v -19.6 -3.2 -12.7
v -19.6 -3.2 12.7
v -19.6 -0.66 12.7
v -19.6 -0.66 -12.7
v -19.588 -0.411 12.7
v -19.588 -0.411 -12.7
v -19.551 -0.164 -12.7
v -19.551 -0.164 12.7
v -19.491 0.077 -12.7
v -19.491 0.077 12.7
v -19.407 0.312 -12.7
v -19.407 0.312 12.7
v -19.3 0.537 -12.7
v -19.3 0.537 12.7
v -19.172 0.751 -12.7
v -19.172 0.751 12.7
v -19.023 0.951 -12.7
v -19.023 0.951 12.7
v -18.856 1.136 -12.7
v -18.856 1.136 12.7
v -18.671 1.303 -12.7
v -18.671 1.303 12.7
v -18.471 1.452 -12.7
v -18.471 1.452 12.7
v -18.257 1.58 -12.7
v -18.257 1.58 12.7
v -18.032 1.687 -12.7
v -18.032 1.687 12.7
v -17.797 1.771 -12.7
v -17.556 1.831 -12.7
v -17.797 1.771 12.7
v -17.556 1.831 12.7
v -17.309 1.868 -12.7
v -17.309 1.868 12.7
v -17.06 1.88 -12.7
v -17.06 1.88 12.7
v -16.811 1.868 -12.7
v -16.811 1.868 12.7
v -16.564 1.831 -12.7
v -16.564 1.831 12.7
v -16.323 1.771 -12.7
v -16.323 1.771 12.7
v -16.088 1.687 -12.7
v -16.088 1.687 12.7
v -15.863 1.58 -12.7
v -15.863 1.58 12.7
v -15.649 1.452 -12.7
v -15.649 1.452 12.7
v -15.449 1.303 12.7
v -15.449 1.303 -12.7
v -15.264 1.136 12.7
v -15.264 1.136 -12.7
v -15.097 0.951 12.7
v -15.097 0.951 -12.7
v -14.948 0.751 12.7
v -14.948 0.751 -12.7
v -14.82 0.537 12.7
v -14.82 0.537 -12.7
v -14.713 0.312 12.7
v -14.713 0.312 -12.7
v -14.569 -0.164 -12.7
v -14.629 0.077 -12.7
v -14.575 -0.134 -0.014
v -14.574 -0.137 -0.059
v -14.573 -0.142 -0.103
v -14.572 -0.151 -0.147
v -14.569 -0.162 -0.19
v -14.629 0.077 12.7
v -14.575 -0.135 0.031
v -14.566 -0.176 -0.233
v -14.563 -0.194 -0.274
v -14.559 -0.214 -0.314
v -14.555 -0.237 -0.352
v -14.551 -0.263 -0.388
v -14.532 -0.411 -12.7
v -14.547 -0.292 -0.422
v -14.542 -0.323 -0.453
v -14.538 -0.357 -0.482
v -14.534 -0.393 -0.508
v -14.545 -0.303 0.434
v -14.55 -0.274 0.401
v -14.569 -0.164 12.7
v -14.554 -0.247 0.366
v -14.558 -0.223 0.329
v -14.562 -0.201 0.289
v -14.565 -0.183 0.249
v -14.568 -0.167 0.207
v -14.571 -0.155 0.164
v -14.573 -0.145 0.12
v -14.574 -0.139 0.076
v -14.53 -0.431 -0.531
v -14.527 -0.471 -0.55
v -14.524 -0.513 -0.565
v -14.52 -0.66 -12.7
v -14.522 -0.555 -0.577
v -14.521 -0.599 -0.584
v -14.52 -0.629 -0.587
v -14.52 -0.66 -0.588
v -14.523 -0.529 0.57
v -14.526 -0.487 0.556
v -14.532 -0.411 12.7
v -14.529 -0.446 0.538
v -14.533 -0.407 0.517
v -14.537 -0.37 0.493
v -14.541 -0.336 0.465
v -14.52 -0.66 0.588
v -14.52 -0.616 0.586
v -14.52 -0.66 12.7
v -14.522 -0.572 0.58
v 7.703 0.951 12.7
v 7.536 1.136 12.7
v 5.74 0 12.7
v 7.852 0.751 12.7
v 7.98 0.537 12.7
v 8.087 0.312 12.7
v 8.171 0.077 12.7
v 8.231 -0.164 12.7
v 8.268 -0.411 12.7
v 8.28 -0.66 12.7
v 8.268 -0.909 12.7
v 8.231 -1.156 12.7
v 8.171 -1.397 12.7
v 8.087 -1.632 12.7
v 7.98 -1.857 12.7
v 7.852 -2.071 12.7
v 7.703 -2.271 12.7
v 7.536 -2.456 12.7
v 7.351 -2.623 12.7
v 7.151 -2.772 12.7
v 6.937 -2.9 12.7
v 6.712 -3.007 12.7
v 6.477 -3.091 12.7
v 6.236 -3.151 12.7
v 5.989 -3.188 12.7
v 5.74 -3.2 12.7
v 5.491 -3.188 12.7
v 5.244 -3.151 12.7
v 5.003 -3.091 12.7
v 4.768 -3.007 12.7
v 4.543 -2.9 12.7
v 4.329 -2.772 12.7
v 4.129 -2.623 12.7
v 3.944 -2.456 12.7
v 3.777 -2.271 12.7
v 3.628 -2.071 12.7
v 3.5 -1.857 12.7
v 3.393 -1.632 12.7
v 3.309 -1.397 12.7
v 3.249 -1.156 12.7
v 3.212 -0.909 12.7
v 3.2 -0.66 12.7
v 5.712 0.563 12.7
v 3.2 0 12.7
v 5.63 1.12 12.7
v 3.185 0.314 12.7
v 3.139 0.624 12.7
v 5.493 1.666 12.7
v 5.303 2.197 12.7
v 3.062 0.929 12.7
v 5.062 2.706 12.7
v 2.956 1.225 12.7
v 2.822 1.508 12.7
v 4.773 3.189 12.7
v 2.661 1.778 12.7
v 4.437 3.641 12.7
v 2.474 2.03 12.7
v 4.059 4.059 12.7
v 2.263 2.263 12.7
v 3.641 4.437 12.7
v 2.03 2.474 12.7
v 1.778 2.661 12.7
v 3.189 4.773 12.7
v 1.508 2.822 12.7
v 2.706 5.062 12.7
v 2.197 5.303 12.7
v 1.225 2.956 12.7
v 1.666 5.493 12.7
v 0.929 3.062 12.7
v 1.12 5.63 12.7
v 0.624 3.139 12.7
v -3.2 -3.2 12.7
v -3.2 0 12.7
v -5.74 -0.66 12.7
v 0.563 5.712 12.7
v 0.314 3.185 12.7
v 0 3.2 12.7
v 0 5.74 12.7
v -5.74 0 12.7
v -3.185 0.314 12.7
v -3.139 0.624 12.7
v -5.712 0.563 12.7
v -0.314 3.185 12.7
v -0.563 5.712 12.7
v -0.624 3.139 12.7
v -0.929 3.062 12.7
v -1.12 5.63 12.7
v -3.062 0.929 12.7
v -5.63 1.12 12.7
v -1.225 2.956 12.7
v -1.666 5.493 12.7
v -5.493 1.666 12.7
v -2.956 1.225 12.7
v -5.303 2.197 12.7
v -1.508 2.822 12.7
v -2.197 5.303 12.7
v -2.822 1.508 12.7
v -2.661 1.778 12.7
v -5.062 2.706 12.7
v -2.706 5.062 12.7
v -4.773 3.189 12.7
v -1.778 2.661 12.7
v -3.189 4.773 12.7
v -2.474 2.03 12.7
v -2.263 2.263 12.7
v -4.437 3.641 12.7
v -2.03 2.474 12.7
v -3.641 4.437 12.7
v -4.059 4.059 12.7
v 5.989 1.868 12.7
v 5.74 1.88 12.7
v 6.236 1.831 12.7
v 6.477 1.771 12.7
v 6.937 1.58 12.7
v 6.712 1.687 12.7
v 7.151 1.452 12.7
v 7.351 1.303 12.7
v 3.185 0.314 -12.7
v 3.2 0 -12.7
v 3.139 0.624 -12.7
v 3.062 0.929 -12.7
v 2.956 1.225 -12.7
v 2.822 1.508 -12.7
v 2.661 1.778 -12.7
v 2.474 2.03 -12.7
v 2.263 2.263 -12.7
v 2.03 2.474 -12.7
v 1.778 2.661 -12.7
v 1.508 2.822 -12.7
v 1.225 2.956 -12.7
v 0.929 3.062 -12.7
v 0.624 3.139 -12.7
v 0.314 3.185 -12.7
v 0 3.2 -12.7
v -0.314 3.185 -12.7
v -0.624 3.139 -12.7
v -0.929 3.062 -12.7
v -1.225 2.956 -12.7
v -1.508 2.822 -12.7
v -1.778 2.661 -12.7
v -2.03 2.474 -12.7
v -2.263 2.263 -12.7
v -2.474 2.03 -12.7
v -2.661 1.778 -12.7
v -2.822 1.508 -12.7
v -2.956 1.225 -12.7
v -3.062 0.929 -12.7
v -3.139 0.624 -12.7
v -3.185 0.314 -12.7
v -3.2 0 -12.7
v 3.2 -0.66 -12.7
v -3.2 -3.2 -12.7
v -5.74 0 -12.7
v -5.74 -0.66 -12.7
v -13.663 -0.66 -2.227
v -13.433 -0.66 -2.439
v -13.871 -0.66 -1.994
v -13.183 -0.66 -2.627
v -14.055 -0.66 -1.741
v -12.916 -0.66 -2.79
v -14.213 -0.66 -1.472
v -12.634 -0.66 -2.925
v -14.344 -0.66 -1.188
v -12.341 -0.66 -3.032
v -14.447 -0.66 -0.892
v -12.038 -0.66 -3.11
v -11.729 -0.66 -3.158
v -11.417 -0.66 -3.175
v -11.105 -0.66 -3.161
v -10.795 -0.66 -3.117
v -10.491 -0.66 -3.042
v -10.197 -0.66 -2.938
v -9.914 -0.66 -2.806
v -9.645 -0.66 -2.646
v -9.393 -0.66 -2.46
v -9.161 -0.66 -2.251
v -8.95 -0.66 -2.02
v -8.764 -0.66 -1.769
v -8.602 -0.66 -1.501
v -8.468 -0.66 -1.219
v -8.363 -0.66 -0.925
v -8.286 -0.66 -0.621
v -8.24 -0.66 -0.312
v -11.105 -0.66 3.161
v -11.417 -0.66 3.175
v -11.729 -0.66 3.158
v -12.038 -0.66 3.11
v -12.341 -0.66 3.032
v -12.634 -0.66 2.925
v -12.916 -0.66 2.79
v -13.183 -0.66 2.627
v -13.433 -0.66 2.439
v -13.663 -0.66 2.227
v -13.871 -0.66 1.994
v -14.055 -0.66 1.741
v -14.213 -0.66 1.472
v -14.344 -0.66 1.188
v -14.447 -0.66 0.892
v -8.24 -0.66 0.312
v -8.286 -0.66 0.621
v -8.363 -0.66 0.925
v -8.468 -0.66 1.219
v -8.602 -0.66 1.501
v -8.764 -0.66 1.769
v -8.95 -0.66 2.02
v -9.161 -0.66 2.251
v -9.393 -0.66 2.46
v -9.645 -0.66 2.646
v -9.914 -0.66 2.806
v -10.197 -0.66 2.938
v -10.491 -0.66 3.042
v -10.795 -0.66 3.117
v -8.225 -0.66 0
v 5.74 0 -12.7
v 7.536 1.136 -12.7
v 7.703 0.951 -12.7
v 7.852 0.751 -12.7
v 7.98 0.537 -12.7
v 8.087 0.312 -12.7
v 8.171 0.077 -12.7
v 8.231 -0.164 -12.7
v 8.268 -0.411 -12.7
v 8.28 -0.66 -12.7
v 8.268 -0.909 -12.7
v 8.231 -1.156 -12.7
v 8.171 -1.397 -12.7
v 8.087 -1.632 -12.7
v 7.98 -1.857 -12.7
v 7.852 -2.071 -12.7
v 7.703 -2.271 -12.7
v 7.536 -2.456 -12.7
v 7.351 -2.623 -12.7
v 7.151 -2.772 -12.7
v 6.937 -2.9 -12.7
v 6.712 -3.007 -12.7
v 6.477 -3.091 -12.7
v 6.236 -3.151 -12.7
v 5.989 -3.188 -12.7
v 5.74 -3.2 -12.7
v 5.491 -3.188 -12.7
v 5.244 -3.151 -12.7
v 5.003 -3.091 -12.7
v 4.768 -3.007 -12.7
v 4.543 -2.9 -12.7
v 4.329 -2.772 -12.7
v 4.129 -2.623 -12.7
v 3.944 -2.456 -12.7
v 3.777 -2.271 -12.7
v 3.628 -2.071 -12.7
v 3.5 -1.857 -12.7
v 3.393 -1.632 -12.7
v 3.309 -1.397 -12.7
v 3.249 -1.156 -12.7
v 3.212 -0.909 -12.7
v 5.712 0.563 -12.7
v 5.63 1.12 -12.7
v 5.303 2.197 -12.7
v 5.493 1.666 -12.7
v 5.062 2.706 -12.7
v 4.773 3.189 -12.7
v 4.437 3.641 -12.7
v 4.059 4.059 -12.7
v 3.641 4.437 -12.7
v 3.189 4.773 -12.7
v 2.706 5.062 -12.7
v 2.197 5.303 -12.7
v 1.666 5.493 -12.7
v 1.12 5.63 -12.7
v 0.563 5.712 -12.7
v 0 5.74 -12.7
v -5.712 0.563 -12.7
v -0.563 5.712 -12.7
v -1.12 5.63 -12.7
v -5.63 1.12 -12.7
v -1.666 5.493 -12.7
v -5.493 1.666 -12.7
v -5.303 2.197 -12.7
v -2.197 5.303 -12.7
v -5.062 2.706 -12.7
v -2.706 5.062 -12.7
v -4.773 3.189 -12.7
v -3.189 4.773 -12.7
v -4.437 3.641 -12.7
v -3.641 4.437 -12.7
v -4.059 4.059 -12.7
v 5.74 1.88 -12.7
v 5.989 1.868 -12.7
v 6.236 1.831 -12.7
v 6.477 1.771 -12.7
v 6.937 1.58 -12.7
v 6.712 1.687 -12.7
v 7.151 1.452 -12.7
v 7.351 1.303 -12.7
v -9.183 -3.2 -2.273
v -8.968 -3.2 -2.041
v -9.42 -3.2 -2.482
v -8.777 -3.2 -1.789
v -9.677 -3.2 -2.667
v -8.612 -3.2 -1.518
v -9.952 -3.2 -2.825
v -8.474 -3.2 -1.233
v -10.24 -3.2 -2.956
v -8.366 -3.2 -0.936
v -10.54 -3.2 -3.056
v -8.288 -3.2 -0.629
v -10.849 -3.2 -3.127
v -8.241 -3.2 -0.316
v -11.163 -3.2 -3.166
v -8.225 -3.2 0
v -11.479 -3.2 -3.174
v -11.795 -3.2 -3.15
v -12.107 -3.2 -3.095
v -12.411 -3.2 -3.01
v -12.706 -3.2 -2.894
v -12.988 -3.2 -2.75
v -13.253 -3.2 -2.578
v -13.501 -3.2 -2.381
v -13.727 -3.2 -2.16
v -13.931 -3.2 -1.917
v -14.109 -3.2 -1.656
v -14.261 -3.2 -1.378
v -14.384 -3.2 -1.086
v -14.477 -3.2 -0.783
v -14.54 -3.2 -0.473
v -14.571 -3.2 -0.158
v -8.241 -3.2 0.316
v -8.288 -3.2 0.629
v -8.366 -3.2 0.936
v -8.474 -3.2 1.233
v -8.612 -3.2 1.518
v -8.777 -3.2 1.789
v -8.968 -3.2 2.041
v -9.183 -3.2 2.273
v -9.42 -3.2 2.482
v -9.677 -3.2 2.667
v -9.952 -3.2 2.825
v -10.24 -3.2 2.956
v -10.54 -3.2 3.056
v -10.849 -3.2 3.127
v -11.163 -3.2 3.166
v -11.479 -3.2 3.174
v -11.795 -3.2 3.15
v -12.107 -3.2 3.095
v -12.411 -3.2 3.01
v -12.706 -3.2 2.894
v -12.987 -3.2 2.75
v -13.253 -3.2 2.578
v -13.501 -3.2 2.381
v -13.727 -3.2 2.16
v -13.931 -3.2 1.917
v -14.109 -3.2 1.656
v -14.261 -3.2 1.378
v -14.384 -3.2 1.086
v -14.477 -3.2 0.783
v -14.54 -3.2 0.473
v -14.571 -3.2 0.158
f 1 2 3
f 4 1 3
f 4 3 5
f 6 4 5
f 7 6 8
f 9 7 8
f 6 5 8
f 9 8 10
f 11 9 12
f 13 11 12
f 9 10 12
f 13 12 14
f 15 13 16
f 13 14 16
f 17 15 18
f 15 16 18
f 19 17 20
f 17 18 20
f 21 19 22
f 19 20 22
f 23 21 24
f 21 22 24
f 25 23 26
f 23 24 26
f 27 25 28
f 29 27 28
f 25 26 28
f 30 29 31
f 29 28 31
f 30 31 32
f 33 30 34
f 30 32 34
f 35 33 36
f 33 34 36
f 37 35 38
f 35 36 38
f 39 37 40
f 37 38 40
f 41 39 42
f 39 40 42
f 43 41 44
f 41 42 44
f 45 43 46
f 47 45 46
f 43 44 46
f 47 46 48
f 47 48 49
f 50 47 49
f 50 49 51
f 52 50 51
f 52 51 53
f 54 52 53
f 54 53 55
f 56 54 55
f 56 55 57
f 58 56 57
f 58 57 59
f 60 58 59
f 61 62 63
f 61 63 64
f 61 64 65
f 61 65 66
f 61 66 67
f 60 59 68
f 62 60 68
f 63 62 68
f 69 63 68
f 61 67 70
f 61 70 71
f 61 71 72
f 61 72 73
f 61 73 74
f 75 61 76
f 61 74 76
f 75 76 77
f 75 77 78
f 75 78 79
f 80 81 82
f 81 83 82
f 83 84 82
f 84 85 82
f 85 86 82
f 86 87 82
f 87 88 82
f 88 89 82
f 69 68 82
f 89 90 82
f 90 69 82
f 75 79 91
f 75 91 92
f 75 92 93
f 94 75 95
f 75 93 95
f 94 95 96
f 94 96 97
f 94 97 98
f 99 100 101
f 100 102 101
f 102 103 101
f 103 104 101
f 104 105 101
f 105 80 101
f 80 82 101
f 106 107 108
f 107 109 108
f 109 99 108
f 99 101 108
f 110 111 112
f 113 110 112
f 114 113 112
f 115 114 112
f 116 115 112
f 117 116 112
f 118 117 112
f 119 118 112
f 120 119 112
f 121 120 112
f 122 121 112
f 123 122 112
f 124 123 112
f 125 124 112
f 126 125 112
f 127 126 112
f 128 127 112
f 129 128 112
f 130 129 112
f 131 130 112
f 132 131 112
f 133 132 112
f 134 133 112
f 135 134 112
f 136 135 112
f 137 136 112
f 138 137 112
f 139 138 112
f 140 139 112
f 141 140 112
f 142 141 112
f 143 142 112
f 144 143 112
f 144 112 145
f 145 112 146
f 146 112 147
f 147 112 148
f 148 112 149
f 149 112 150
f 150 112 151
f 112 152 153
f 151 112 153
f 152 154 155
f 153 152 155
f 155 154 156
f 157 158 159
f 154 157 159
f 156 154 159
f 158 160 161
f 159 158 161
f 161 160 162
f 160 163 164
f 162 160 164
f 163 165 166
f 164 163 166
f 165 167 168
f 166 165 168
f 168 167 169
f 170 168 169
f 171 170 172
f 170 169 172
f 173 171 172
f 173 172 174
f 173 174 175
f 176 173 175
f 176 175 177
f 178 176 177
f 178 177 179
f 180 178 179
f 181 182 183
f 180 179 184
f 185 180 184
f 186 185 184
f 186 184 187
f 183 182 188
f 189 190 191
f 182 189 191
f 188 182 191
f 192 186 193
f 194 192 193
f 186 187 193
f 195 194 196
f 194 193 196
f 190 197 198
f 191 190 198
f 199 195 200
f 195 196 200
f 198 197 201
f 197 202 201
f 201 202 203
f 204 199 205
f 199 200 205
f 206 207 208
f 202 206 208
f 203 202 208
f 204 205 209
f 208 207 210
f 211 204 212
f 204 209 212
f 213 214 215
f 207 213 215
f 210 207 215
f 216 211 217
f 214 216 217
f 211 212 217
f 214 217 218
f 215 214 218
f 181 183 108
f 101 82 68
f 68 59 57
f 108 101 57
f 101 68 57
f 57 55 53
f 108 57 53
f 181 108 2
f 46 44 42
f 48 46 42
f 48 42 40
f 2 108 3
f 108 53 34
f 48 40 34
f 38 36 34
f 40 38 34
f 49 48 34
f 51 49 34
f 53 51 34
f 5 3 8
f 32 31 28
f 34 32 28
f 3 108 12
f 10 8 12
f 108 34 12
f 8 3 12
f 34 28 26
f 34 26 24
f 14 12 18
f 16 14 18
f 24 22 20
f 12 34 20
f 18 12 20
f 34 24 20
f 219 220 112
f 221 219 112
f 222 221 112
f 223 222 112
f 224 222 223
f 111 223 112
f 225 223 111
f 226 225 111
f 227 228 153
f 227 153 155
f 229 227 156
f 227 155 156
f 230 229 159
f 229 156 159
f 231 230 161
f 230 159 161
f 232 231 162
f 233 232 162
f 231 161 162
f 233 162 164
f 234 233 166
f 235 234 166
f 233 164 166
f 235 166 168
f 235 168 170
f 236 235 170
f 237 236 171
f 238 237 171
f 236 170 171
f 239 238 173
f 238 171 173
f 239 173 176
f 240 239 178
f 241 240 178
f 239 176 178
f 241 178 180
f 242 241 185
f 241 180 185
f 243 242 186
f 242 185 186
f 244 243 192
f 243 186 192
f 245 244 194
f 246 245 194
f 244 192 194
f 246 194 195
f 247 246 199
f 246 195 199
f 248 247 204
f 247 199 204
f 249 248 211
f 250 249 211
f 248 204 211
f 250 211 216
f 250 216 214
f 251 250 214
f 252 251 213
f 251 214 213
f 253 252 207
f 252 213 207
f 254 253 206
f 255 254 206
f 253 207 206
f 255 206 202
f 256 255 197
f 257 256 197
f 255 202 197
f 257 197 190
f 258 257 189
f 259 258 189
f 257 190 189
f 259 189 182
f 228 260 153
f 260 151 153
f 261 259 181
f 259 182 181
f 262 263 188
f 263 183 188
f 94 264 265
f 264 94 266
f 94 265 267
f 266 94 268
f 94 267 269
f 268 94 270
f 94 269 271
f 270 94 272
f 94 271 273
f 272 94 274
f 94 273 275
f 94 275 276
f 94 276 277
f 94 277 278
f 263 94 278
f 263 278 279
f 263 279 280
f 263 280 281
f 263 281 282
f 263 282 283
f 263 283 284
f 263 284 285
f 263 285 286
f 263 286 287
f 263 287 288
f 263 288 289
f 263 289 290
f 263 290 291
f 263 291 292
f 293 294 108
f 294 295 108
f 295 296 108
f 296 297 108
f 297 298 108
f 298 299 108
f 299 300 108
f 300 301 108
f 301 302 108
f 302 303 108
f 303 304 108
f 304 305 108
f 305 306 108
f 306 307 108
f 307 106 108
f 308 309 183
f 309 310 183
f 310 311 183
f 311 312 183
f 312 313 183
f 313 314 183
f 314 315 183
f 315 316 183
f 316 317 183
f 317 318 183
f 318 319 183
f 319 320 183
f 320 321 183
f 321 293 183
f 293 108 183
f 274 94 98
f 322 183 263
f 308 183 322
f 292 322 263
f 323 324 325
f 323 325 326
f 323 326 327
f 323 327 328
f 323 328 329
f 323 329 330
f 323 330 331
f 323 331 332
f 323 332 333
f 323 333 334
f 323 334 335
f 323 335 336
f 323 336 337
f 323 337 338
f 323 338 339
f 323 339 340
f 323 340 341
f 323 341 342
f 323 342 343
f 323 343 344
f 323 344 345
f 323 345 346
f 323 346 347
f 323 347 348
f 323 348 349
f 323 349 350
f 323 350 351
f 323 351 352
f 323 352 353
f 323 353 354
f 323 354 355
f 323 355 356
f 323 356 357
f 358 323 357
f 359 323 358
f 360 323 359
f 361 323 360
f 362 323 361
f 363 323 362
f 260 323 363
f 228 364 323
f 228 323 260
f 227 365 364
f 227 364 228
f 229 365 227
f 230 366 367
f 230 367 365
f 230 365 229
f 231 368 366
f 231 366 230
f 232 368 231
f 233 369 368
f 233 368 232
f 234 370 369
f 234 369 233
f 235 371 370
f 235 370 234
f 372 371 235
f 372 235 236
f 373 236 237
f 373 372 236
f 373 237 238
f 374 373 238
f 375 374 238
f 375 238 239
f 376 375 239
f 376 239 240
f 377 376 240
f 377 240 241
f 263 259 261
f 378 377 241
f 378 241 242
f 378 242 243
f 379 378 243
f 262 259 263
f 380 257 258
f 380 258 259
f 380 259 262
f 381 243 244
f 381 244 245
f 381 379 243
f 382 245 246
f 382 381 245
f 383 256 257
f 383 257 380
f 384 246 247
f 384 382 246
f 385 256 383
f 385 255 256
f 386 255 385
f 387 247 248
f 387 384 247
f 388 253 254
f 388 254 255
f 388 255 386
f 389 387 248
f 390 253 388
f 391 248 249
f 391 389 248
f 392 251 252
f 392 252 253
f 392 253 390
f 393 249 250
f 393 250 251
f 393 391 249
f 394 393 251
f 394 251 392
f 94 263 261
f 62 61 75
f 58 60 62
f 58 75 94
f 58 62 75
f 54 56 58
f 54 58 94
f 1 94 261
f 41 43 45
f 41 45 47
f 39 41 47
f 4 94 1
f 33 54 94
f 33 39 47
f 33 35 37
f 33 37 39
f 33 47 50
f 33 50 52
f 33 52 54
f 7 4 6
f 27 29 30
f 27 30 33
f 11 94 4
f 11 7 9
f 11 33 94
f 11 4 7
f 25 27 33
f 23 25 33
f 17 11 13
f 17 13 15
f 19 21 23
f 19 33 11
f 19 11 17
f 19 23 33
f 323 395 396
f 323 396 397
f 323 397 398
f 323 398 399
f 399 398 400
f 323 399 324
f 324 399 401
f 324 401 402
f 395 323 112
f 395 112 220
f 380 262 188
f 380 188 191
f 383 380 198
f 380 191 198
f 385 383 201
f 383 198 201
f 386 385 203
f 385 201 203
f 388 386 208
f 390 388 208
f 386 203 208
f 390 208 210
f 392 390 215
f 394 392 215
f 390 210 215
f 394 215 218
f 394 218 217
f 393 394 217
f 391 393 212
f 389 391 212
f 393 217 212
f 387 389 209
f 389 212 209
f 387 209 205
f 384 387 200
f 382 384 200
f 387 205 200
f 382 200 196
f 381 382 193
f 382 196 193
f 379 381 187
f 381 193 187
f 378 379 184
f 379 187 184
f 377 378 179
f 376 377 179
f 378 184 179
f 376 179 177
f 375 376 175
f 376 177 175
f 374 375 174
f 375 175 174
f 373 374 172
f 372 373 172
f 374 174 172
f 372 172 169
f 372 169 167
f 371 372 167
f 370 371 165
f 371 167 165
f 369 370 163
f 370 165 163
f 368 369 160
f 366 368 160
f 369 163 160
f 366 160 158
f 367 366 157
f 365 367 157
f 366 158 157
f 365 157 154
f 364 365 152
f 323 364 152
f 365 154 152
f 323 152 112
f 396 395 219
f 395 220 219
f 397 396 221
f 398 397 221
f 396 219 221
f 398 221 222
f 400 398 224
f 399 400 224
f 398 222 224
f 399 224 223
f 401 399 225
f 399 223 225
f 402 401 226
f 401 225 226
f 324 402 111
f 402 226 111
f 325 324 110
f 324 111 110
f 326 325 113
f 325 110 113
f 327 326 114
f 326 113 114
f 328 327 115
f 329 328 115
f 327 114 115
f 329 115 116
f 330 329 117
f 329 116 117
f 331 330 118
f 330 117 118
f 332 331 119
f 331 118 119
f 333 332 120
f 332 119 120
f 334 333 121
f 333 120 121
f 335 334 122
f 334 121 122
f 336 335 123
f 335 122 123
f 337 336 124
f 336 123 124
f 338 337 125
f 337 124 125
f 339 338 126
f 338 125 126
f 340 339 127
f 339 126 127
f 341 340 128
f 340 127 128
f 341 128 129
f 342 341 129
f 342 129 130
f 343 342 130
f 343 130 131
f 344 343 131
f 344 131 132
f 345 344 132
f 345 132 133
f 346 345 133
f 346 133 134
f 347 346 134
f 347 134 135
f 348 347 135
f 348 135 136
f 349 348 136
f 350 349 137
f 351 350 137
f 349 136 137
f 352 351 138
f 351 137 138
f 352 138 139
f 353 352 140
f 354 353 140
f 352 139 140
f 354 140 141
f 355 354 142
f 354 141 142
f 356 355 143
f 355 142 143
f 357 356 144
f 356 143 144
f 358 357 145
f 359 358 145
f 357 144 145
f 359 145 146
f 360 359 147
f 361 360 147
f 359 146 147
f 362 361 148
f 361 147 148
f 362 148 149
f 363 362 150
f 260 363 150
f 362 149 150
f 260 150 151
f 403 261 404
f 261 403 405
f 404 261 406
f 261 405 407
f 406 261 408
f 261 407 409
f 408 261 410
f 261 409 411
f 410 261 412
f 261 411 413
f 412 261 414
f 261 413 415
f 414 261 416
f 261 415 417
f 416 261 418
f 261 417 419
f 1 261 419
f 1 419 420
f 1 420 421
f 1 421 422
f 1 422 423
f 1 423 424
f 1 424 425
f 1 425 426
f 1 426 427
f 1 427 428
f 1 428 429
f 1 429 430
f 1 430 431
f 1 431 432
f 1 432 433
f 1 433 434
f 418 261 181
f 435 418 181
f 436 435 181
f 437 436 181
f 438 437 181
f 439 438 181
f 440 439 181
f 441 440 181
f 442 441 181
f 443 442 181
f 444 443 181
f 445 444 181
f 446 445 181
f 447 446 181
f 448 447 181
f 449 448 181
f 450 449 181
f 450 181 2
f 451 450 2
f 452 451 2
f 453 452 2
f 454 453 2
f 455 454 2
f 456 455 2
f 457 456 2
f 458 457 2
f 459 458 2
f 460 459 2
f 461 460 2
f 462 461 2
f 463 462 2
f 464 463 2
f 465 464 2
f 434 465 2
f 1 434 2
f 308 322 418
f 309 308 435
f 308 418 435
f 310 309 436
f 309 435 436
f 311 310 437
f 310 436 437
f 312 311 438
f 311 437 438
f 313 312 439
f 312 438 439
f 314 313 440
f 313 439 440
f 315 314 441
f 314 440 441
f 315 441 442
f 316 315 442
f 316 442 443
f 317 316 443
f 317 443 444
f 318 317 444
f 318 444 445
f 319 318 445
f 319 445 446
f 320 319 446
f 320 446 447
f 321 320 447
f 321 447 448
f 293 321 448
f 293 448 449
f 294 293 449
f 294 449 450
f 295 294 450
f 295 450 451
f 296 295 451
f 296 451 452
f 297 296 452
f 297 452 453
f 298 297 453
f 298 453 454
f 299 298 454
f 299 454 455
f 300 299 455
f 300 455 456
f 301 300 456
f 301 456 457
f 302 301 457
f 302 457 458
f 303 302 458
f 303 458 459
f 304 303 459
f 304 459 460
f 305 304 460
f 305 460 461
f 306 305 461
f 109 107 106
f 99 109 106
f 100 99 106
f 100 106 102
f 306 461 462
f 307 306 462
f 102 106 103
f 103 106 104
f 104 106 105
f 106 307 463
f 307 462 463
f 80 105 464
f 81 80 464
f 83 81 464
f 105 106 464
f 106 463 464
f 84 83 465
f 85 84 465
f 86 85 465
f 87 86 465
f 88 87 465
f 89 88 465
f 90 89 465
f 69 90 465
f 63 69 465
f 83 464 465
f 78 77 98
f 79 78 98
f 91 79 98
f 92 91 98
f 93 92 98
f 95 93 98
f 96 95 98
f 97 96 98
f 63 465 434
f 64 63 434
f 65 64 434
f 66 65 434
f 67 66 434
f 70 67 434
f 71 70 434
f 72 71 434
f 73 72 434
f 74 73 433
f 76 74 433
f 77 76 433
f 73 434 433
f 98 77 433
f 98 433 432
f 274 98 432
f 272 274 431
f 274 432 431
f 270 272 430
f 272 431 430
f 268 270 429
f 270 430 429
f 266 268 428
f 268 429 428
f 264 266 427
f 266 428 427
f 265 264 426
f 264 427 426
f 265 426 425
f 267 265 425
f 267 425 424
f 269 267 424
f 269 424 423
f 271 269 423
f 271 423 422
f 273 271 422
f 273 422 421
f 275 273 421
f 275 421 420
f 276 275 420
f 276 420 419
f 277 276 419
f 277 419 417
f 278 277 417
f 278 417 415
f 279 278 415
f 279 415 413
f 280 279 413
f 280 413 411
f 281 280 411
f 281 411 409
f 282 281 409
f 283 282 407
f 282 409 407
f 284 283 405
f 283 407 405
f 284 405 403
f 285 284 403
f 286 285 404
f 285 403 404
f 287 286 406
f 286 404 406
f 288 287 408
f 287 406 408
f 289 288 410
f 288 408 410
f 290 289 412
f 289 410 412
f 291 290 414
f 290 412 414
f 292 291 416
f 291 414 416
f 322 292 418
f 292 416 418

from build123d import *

# Parameters (mm, degrees)
BASE_EXTRUDE_DEPTH = 12.7
SKETCH9_R          = 3.175
CUT_EXTRUDE1_DEPTH = 26.007470884


with BuildPart() as part:
    # Sketch1 → Base-Extrude (new, symmetric)
    with BuildSketch(Plane.XY):
        with BuildLine():
            Line((-14.52, -0.66), (-5.74, -0.66))
            Line((-5.74, -0.66), (-5.74, 0))
            ThreePointArc((-5.74, 0), (0, 5.74), (5.74, 0))
            Line((5.74, 0), (5.74, 1.88))
            ThreePointArc((5.74, 1.88), (7.536051224, -2.456051224), (3.2, -0.66))
            Line((3.2, -0.66), (3.2, 0))
            ThreePointArc((3.2, 0), (0, 3.2), (-3.2, 0))
            Line((-3.2, 0), (-3.2, -3.2))
            Line((-3.2, -3.2), (-19.6, -3.2))
            Line((-19.6, -3.2), (-19.6, -0.66))
            ThreePointArc((-19.6, -0.66), (-17.06, 1.88), (-14.52, -0.66))
        make_face()
    extrude(amount=BASE_EXTRUDE_DEPTH, both=True)

    # Sketch9 → Cut-Extrude1 (cut, through all)
    with BuildSketch(Plane.XZ.offset(3.2)):
        with Locations((-11.4, 0)):
            Circle(SKETCH9_R)
    extrude(amount=-CUT_EXTRUDE1_DEPTH, mode=Mode.SUBTRACT)


solid = part.part
